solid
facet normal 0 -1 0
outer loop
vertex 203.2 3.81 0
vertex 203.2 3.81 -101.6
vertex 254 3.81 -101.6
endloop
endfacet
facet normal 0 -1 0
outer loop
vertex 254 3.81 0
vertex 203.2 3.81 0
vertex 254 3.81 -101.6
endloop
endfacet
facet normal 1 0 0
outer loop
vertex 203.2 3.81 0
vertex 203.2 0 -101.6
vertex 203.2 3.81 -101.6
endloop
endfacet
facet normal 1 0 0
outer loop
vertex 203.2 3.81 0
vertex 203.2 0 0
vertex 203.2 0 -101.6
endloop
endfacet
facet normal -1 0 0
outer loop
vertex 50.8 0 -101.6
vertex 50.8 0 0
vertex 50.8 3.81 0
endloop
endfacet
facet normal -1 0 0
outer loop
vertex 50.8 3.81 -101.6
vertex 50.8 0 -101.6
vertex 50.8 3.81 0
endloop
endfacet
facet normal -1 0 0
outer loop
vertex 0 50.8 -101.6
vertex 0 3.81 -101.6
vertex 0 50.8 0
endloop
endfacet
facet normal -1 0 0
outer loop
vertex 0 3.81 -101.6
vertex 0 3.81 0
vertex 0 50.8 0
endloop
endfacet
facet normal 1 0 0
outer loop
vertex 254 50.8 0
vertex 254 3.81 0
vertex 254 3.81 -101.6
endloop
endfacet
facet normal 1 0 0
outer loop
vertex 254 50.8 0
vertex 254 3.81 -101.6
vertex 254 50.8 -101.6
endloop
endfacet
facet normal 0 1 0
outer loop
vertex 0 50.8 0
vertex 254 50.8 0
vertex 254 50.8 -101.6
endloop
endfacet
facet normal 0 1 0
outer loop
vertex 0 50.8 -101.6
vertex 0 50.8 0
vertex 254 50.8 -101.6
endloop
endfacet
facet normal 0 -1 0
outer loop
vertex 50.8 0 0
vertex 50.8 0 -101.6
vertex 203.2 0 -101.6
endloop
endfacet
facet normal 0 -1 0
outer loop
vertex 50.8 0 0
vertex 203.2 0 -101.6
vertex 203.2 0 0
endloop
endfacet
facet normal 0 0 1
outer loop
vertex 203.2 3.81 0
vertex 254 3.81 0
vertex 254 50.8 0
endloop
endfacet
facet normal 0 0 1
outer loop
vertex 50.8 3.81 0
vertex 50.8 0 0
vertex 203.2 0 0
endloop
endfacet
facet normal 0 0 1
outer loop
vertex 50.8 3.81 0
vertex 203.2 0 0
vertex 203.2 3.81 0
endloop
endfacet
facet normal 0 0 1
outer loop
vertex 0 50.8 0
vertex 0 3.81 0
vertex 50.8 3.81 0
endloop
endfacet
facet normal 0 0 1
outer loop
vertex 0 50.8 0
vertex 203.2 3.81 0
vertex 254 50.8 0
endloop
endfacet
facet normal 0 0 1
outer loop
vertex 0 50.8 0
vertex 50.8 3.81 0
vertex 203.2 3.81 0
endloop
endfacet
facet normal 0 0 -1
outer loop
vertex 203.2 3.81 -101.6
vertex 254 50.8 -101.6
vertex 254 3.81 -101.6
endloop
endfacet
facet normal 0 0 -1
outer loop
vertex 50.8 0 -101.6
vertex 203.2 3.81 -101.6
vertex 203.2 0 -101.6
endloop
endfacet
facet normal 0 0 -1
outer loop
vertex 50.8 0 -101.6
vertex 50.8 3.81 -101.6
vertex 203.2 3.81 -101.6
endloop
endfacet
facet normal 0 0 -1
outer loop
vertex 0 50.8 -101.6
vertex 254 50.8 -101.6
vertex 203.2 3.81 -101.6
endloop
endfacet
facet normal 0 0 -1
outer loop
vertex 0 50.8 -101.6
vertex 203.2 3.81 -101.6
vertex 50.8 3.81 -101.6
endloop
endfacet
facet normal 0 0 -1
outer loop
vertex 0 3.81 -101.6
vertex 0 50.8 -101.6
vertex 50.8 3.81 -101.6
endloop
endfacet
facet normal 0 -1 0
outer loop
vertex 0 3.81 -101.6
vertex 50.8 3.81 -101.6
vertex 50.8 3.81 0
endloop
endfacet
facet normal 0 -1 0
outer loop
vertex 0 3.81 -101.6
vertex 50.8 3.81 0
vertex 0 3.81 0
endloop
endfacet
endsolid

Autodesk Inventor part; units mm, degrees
ref_plane "YZ Plane" through (0, 0, 0) normal (1, 0, 0) x (0, 1, 0)
ref_plane "XZ Plane" through (0, 0, 0) normal (0, 1, 0) x (-1, 0, 0)
ref_plane "XY Plane" through (0, 0, 0) normal (0, 0, 1) x (1, 0, 0)
sketch "Sketch1" plane through (0, 0, 0) normal (1, 0, 0) x (0, 1, 0)
  line L0 (0, 0) -> (50.8, 0)
  line L1 (50.8, 0) -> (50.8, -101.6)
  line L2 (50.8, -101.6) -> (0, -101.6)
  line L3 (0, -101.6) -> (0, 0)
  dimension "d0" = 50.8
  dimension "d1" = 101.6
extrude "Extrusion1" add sketch "Sketch1" along normal blind 254
sketch "Sketch2" plane through (0, 0, 0) normal (0, 0, 1) x (1, 0, 0)
  line L0 (0, 0) -> (0, 50.8) projected
  line L1 (0, 0) -> (254, 0) projected
  line L2 (254, 50.8) -> (254, 0) projected
  line L3 (0, 50.8) -> (254, 50.8) projected
  line L4 (0, 0) -> (254, 0) projected
  line L5 (50.8, 0) -> (50.8, 3.81)
  line L6 (50.8, 3.81) -> (0, 3.81)
  line L7 (0, 0) -> (0, 50.8) projected
  line L8 (127, 0) -> (127, 50.8) construction
  line L9 (203.2, 0) -> (203.2, 3.81)
  line L10 (203.2, 3.81) -> (254, 3.81)
  line L11 (50.8, 0) -> (0, 0)
  line L12 (203.2, 0) -> (254, 0)
  line L13 (254, 50.8) -> (254, 0) projected
  line L14 (254, 3.81) -> (254, 0)
  dimension "d4" = 3.81
  dimension "d5" = 90
  dimension "d6" = 50.8
extrude "Extrusion2" cut sketch "Sketch2" against normal up to next contours L0 L6 L5 L1 | L9 L10 L2 L1
properties part number "lifterBase"
